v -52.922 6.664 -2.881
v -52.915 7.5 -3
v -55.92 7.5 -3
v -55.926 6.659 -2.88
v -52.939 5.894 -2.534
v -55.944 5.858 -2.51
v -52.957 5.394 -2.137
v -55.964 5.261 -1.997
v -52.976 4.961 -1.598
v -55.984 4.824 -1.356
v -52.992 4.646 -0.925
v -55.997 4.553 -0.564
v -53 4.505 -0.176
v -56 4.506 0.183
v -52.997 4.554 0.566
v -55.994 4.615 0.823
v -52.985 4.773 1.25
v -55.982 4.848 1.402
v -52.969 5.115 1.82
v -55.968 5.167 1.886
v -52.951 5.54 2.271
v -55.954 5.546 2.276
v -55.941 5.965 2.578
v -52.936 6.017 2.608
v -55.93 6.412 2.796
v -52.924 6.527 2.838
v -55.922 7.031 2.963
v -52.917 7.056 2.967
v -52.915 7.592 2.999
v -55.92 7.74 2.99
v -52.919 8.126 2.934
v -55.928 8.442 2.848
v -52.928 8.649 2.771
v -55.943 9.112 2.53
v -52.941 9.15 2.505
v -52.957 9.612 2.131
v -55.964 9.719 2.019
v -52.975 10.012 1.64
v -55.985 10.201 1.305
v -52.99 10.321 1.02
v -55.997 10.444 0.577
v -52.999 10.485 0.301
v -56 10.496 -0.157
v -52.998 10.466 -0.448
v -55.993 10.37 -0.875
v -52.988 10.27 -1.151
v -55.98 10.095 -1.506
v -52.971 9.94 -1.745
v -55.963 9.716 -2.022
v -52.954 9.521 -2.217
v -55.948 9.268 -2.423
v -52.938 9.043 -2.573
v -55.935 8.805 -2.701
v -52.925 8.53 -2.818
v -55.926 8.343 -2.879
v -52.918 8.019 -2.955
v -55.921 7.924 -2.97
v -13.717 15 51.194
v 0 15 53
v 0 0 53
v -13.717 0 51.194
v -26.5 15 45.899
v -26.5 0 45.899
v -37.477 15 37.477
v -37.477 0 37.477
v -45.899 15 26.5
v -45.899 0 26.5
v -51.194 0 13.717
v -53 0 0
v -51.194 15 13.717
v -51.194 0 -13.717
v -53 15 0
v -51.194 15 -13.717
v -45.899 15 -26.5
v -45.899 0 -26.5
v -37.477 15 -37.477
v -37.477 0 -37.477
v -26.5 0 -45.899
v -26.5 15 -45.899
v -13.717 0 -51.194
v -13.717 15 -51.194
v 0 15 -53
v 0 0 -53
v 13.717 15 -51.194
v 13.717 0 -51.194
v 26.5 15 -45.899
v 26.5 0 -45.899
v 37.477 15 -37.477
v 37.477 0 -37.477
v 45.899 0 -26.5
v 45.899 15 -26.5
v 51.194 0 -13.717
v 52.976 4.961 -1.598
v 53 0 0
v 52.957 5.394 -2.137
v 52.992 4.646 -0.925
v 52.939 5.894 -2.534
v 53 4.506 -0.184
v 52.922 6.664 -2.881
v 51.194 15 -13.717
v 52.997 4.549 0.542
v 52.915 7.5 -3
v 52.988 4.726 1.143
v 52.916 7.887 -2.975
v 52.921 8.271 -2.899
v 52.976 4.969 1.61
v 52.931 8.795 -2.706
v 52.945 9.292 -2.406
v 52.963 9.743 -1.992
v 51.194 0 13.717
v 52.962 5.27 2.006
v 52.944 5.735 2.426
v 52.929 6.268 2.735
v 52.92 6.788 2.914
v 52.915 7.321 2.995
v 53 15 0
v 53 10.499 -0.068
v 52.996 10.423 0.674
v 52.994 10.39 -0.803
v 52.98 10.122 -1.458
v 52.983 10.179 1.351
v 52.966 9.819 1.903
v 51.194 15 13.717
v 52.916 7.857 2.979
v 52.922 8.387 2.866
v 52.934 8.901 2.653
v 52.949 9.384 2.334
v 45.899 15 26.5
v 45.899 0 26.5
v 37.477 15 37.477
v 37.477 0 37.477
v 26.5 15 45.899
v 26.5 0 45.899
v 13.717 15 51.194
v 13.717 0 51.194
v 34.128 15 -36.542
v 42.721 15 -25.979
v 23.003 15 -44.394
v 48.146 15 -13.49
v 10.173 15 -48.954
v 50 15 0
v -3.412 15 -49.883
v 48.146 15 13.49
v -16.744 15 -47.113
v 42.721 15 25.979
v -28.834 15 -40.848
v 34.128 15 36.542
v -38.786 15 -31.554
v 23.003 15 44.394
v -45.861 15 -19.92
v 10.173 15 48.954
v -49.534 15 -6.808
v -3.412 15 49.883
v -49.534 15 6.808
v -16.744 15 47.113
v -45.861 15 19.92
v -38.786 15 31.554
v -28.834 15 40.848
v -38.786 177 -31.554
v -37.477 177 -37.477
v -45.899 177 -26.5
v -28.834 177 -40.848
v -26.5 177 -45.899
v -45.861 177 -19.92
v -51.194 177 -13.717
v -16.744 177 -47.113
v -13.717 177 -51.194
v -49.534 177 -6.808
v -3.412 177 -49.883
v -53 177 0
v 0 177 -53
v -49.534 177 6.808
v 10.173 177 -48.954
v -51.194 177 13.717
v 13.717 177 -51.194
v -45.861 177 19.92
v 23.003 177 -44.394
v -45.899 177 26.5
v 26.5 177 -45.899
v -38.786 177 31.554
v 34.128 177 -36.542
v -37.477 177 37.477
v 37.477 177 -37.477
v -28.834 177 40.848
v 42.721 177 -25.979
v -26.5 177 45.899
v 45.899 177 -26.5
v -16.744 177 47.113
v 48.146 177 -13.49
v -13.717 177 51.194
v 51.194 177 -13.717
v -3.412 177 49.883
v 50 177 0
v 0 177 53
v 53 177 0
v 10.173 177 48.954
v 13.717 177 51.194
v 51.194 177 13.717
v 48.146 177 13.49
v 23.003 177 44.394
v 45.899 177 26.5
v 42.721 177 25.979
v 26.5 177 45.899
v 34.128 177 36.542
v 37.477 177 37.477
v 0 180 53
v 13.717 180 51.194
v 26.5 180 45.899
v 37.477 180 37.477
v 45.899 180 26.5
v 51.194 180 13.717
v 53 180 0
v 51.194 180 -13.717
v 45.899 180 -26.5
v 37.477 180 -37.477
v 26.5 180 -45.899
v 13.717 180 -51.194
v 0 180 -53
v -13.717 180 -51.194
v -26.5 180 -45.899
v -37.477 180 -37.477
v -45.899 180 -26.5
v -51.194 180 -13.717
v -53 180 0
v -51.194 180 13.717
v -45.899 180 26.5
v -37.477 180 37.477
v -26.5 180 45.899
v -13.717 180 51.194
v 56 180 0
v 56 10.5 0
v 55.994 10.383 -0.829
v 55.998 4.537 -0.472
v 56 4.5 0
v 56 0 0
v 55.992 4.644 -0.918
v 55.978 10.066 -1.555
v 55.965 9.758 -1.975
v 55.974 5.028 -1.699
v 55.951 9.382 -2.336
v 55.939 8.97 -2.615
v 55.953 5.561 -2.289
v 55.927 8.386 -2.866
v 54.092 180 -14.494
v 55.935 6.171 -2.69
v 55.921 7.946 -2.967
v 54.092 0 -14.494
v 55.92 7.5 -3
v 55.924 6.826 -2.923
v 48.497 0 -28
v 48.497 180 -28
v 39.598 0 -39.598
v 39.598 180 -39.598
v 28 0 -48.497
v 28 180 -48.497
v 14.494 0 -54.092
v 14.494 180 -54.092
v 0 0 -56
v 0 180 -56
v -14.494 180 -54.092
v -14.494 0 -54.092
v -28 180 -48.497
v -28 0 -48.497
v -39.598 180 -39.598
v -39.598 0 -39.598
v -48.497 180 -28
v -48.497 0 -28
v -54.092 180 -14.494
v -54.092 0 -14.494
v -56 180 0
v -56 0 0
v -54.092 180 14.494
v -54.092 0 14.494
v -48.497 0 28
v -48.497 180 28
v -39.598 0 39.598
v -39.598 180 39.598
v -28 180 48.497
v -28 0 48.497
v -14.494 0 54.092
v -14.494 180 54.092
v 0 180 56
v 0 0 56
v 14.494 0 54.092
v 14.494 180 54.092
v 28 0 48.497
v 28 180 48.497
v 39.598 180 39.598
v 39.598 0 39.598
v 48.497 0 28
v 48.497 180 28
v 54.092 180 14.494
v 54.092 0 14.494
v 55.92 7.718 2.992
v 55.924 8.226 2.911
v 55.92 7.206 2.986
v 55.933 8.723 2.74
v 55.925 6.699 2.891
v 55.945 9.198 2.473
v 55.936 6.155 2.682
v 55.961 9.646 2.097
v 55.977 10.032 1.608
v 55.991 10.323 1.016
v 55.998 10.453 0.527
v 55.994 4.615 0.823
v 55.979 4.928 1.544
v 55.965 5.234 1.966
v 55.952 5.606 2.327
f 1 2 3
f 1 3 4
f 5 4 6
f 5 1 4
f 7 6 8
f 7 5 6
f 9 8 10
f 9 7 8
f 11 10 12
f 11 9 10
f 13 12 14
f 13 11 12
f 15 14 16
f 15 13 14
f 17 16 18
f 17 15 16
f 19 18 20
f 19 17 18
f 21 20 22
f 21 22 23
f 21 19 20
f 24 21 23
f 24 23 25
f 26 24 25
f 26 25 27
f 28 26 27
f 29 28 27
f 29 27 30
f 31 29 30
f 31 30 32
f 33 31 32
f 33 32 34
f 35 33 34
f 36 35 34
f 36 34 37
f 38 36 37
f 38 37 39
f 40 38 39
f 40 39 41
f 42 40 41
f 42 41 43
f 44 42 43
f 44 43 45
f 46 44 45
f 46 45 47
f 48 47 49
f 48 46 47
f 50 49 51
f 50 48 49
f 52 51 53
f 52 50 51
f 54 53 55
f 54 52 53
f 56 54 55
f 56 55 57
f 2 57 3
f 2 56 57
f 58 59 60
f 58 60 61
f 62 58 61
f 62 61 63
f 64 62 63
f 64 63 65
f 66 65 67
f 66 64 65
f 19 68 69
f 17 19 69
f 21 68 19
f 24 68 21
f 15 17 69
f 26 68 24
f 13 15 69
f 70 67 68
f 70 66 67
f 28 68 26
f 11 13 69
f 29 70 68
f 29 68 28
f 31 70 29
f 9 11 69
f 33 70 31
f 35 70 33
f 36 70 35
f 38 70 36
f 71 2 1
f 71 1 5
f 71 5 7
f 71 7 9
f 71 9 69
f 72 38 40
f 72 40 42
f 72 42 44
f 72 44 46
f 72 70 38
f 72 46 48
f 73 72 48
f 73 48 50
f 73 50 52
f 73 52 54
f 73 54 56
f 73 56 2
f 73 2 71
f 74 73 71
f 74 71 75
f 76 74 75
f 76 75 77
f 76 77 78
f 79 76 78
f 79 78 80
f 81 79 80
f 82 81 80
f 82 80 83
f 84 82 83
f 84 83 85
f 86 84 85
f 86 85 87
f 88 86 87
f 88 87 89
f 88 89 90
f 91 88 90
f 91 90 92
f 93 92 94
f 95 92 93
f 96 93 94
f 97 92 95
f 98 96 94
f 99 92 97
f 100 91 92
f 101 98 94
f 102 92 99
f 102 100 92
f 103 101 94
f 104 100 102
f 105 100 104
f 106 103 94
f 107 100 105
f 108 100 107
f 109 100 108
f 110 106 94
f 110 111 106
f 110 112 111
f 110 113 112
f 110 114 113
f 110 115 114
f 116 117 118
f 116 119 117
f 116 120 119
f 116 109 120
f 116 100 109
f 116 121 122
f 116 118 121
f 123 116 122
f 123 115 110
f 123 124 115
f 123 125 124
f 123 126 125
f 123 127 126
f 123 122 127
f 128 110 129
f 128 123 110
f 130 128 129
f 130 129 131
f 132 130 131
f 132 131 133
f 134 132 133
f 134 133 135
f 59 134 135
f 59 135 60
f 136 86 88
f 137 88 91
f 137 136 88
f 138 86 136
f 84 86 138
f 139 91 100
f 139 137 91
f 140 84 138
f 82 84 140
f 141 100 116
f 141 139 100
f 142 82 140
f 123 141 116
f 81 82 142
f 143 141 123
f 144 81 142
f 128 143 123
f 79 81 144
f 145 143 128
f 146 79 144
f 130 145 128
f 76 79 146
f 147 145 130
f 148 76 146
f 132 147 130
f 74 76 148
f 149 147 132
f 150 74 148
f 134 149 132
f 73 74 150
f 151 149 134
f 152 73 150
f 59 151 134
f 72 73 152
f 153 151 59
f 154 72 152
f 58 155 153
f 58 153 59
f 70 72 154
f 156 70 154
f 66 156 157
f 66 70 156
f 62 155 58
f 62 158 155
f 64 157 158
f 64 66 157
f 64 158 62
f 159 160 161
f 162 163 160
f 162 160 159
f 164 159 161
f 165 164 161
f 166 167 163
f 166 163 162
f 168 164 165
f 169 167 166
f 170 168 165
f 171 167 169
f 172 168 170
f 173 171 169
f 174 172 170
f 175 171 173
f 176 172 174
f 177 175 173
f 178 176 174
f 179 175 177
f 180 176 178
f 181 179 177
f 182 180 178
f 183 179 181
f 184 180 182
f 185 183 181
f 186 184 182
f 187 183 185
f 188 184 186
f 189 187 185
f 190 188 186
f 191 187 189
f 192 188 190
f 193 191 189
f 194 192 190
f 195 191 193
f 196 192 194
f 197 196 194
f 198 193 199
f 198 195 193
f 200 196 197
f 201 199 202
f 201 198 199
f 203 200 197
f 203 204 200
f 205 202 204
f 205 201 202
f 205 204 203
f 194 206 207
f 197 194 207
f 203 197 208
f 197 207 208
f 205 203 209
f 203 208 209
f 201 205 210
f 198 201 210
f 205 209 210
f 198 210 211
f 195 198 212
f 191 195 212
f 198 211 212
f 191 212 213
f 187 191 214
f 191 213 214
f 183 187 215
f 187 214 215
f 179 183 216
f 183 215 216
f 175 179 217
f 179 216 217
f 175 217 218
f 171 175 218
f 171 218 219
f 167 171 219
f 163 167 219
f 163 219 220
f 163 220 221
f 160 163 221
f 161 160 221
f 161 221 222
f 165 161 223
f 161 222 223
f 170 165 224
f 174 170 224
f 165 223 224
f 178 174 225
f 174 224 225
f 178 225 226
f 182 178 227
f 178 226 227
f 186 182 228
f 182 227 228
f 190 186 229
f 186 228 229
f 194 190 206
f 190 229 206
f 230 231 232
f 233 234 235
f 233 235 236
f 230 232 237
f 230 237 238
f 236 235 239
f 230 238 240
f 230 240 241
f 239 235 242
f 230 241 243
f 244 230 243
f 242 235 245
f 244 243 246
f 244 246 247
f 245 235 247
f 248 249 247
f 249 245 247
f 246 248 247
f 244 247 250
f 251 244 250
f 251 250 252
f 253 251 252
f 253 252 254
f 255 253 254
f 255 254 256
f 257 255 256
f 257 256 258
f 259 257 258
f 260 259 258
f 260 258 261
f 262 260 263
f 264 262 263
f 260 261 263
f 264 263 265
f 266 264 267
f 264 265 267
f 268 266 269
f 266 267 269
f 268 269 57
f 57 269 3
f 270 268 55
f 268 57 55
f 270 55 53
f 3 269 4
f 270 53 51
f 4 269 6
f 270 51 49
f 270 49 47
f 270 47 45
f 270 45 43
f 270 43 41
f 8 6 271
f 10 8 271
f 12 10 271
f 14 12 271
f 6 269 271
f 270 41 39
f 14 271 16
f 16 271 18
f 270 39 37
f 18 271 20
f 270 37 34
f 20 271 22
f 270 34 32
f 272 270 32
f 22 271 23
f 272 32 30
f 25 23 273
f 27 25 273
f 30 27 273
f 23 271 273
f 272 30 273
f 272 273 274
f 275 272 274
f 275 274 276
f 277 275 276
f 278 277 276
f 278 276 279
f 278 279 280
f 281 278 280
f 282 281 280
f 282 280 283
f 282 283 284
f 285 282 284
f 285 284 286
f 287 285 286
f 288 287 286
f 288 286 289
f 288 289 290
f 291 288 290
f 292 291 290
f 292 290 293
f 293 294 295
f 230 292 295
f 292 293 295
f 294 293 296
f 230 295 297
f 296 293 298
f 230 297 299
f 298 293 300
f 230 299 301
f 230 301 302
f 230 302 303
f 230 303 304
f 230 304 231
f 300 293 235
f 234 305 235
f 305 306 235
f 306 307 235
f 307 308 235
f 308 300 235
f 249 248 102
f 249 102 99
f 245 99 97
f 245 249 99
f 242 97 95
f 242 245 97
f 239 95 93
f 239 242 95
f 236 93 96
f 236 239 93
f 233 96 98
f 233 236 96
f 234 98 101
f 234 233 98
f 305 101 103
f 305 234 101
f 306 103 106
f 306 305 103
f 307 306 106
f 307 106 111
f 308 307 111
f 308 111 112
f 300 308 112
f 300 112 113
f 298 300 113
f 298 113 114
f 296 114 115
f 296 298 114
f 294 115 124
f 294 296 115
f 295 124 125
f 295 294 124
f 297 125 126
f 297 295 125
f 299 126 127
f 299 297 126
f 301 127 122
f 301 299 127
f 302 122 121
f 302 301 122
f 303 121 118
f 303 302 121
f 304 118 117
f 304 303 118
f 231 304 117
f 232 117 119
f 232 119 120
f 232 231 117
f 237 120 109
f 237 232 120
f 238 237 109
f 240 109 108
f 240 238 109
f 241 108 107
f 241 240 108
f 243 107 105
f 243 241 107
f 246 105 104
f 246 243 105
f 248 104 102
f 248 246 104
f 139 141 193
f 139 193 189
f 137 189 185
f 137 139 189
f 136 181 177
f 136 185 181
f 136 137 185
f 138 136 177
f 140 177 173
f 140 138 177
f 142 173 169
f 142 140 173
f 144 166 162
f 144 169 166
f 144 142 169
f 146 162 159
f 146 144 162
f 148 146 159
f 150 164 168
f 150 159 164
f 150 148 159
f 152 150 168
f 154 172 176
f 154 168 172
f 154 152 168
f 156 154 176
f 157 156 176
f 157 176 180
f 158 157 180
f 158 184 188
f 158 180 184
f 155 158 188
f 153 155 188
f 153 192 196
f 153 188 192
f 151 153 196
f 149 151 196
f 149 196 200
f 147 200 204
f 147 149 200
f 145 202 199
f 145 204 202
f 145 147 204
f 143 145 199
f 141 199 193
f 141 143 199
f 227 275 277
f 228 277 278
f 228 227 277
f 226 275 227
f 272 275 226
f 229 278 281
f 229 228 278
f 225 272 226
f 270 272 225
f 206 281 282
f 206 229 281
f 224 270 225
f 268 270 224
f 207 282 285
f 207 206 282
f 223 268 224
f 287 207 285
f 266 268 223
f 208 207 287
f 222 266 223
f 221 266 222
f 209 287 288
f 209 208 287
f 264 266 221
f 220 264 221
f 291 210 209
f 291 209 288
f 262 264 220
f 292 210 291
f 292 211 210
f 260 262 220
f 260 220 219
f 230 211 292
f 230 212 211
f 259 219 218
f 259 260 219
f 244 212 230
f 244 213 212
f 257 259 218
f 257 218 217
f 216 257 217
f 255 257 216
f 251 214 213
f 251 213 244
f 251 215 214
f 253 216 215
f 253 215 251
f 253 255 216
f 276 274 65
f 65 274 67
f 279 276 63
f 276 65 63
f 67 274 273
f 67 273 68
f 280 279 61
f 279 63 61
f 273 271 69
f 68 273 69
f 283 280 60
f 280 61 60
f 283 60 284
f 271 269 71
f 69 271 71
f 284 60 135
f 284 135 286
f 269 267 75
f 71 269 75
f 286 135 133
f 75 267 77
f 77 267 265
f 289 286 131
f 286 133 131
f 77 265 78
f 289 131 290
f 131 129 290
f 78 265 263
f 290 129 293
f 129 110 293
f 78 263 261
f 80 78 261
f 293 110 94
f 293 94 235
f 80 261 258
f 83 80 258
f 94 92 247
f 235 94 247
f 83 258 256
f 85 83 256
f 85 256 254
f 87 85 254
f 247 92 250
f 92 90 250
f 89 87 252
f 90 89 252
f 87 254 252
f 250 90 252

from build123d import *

# Parameters (mm, degrees)
SKETCH1_R               = 56
SKETCH1_R_2             = 50
EXTRUDE_THIN1_DEPTH     = 180
SKETCH2_R               = 53
CUT_EXTRUDE1_DEPTH      = 3
CUT_EXTRUDE2_START      = -15
SKETCH3_R               = 53
CUT_EXTRUDE2_DEPTH      = 15
CUT_EXTRUDE3_DEPTH      = 218.754448864
CUT_EXTRUDE3_DEPTH_BACK = 218.754448864
SKETCH5_R               = 3


with BuildPart() as part:
    # Sketch1 → Extrude-Thin1 (new body)
    with BuildSketch(Plane(origin=(0, 0, 0), x_dir=(1, 0, 0), z_dir=(0, 1, 0))):
        Circle(SKETCH1_R)
        Circle(SKETCH1_R_2, mode=Mode.SUBTRACT)
    extrude(amount=EXTRUDE_THIN1_DEPTH)

    # Sketch2 → Cut-Extrude1 (cut)
    with BuildSketch(Plane(origin=(0, 180, 0), x_dir=(1, 0, 0), z_dir=(0, 1, 0))):
        with Locations(Location((0, 0, 0), (0, 0, 270))):
            Circle(SKETCH2_R)
    extrude(amount=-CUT_EXTRUDE1_DEPTH, mode=Mode.SUBTRACT)

    # Sketch3 → Cut-Extrude2 (cut)
    with BuildSketch(Plane.XZ.offset(CUT_EXTRUDE2_START)):
        with Locations(Location((0, 0, 0), (0, 0, 90))):
            Circle(SKETCH3_R)
    extrude(amount=CUT_EXTRUDE2_DEPTH, mode=Mode.SUBTRACT)

    # Sketch5 → Cut-Extrude3 (cut, two sides: drawn at the far end of the back side and taken through both)
    with BuildSketch(Plane.ZY.offset(-53).offset(-CUT_EXTRUDE3_DEPTH_BACK)):
        with Locations(Location((0, 7.5, 0), (0, 0, 180))):
            Circle(SKETCH5_R)
    extrude(amount=CUT_EXTRUDE3_DEPTH + CUT_EXTRUDE3_DEPTH_BACK, mode=Mode.SUBTRACT)


solid = part.part
